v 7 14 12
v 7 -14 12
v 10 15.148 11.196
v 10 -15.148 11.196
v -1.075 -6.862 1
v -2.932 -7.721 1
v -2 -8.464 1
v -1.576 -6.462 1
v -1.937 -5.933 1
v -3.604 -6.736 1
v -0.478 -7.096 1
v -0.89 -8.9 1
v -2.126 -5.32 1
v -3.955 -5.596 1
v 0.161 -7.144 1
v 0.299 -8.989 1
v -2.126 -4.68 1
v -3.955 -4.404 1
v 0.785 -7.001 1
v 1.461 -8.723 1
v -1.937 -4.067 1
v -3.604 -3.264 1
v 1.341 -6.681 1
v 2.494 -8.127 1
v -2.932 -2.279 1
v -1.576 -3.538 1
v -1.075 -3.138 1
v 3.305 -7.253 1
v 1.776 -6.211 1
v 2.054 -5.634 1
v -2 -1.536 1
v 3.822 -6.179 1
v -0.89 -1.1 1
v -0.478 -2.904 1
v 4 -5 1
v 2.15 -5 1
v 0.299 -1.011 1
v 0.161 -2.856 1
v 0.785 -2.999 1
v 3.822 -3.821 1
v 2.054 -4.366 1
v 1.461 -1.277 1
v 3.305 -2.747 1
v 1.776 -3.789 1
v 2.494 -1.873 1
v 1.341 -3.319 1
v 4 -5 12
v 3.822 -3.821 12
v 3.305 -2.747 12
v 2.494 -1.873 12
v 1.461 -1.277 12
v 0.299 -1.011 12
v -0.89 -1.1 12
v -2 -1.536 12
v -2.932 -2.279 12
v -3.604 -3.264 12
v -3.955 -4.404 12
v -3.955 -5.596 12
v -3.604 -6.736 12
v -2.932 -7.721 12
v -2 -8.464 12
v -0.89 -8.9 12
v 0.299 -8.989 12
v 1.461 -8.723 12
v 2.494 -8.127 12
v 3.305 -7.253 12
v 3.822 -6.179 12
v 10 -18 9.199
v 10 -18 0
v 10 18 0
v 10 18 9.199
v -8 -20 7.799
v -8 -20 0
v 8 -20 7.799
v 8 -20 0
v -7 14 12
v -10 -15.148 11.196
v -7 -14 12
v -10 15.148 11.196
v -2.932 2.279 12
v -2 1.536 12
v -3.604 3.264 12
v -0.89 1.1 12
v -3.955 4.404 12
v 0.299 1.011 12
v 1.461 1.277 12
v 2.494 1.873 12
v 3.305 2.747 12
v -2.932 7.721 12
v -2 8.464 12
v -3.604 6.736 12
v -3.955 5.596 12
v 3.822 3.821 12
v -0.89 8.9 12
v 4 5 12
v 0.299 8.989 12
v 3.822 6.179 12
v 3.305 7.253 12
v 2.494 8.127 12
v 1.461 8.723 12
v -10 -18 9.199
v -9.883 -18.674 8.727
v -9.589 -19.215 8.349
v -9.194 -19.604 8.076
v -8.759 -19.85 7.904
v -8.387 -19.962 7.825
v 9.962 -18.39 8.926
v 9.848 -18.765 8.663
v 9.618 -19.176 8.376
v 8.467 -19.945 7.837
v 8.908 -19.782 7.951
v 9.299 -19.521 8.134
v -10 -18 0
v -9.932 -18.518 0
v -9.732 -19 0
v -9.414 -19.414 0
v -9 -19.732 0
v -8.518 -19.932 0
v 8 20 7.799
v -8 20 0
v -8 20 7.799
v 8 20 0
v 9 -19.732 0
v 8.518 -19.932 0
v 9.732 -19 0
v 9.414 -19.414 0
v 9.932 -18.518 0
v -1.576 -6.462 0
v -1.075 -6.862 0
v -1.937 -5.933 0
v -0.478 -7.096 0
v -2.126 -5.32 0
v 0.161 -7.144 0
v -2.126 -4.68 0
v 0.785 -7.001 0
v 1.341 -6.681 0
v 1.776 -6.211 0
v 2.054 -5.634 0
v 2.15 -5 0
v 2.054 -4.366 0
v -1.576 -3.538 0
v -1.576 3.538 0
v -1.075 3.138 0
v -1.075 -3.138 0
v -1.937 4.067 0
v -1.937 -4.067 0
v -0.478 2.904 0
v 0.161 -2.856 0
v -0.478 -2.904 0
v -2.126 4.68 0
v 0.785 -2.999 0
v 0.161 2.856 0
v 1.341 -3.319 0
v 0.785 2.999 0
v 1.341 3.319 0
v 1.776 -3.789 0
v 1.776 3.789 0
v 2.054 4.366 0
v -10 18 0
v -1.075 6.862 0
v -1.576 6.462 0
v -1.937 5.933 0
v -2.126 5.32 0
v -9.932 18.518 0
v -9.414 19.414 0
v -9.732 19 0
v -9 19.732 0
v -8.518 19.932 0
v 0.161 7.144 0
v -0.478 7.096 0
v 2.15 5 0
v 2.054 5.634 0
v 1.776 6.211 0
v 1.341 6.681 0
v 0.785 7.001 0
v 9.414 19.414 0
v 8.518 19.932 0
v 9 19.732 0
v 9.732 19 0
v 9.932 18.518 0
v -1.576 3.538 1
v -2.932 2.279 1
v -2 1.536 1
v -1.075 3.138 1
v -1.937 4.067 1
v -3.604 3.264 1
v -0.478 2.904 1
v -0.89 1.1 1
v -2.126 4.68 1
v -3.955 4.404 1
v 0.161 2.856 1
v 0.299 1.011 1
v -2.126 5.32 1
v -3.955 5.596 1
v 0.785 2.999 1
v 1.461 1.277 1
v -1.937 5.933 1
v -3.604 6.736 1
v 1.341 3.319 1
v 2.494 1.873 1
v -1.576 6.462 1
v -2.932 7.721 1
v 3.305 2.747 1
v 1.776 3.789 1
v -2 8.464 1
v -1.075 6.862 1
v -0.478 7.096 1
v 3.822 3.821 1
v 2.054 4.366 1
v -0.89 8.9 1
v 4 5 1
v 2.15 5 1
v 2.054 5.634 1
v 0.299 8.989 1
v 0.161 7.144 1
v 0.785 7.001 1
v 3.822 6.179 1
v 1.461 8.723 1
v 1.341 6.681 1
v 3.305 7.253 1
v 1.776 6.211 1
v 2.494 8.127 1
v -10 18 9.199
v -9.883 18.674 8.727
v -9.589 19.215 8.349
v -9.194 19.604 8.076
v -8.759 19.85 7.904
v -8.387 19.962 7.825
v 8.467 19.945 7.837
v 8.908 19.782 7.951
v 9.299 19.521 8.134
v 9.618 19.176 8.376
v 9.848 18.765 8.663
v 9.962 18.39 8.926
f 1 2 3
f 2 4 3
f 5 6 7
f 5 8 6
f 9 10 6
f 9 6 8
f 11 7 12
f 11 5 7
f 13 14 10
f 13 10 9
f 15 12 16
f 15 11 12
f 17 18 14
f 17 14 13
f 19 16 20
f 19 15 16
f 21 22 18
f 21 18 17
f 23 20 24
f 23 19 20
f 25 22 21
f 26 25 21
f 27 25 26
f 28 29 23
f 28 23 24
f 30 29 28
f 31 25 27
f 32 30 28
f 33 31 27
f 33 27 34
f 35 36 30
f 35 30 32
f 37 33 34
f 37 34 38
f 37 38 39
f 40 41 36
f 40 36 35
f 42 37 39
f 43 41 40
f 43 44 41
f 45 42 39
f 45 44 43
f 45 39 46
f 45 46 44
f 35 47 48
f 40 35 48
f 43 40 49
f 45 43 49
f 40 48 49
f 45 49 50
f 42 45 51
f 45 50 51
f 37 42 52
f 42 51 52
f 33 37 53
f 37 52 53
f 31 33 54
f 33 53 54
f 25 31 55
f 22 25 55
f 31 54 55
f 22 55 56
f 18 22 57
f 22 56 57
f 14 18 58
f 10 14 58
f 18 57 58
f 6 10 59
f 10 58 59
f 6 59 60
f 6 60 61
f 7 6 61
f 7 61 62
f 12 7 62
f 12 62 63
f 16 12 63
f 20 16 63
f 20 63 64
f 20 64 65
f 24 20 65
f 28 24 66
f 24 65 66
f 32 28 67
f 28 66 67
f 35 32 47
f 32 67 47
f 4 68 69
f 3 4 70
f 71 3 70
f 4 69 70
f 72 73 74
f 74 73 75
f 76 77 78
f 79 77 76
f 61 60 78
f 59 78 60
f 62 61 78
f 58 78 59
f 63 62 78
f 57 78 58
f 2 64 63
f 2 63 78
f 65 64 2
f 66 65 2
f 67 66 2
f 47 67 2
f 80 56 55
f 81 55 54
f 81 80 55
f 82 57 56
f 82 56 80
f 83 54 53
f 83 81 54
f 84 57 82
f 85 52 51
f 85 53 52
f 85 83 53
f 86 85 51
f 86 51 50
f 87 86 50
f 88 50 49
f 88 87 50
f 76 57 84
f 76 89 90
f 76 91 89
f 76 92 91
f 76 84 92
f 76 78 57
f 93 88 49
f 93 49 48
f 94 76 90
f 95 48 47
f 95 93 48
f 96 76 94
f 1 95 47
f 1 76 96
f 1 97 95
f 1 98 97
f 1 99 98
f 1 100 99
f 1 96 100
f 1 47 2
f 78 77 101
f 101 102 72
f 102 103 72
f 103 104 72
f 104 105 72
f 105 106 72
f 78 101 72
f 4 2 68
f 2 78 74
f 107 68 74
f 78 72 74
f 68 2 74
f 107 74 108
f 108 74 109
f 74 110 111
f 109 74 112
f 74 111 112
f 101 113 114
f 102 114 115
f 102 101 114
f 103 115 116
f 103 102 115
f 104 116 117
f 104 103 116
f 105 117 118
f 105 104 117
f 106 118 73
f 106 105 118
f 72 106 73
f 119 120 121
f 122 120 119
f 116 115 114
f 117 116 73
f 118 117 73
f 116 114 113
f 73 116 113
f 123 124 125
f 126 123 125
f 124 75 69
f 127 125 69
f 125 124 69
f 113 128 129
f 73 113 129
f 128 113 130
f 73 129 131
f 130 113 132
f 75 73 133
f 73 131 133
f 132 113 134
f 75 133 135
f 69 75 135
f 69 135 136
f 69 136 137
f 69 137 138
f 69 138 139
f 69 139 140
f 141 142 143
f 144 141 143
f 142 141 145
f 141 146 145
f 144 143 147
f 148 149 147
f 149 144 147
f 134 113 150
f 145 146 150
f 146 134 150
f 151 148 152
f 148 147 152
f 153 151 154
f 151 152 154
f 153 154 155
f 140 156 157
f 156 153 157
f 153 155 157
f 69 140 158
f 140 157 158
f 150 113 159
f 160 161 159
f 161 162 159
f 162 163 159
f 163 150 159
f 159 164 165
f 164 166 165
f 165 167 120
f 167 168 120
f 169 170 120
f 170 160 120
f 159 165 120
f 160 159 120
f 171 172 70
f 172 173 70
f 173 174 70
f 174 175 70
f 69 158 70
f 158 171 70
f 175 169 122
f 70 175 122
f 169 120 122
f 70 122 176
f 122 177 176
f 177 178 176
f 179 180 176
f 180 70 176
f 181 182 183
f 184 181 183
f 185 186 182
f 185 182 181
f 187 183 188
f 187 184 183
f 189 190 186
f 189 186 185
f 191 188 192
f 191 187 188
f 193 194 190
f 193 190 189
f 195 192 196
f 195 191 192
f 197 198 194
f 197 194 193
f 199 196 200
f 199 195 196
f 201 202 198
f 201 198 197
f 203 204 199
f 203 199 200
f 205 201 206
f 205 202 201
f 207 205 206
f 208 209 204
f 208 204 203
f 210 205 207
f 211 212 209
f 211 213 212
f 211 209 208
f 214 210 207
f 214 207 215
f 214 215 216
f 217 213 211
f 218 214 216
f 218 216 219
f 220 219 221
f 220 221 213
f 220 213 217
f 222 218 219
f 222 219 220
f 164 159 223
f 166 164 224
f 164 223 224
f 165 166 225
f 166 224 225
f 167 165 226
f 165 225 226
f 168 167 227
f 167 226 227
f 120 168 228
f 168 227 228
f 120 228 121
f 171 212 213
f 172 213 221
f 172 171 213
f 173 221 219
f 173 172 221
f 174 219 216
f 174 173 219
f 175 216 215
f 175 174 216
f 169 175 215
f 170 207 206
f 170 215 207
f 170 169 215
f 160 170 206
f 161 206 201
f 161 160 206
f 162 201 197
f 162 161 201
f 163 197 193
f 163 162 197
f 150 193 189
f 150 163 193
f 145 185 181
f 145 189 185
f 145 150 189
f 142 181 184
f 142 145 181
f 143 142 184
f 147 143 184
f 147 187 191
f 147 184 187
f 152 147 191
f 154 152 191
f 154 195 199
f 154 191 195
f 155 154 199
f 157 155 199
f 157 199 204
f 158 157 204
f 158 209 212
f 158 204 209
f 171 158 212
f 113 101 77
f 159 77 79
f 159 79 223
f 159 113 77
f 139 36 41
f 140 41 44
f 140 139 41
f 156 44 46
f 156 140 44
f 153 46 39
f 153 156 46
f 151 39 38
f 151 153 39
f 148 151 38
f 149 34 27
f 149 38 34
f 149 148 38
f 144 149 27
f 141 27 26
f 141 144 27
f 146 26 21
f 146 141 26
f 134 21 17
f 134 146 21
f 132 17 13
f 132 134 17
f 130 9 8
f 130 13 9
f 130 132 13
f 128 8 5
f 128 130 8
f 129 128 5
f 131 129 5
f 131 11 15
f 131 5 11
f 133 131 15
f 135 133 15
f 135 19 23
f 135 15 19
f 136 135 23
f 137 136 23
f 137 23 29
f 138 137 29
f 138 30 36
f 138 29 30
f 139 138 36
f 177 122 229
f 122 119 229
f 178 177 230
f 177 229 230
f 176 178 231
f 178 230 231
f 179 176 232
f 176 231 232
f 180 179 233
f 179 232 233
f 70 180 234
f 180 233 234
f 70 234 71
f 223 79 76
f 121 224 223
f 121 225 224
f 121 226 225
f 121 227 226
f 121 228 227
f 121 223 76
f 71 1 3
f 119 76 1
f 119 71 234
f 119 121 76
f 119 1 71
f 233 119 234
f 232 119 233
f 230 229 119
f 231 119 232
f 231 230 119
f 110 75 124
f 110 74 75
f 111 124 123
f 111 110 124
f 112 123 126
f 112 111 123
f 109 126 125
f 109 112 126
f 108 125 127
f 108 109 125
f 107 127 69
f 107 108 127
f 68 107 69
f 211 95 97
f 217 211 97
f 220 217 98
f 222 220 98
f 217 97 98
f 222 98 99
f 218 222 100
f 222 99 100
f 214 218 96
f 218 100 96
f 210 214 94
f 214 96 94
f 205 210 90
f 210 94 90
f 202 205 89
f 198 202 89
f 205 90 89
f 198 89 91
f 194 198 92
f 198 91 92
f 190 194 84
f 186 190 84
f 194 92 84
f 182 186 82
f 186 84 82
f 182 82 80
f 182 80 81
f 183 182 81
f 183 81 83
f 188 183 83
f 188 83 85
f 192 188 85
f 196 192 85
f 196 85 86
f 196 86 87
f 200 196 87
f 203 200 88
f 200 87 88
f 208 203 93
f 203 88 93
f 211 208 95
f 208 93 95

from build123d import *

# Parameters (mm, degrees)
SKETCH1_W           = 20
SKETCH1_H           = 40
SKETCH1_R           = 2.15
BOSS_EXTRUDE1_DEPTH = 12
CHAMFER1_SIZE       = 3
CHAMFER1_SIZE2      = 0.803847577
CHAMFER2_SIZE       = 6
CHAMFER2_SIZE2      = 4.201245229
SKETCH2_R           = 4
CUT_EXTRUDE1_DEPTH  = 11
FILLET1_R           = 2


with BuildPart() as part:
    # Sketch1 → Boss-Extrude1 (new body)
    with BuildSketch(Plane.XY):
        Rectangle(SKETCH1_W, SKETCH1_H)
        with Locations((0, -5)):
            Circle(SKETCH1_R, mode=Mode.SUBTRACT)
        with Locations((0, 5)):
            Circle(SKETCH1_R, mode=Mode.SUBTRACT)
    extrude(amount=BOSS_EXTRUDE1_DEPTH)

    # Chamfer1
    chamfer1_edges = [part.edges().sort_by_distance(p)[0] for p in [
        (-10, 0, 12),
        (10, 0, 12),
    ]]
    chamfer1_side = [part.faces().sort_by_distance(p)[0] for p in [
        (0, 0, 12),
    ]]
    chamfer(chamfer1_edges, length=CHAMFER1_SIZE, length2=CHAMFER1_SIZE2, reference=chamfer1_side[0])

    # Chamfer2
    chamfer2_edges = [part.edges().sort_by_distance(p)[0] for p in [
        (0, -20, 12),
        (0, 20, 12),
    ]]
    chamfer2_side = [part.faces().sort_by_distance(p)[0] for p in [
        (0, 0, 12),
    ]]
    chamfer(chamfer2_edges, length=CHAMFER2_SIZE, length2=CHAMFER2_SIZE2, reference=chamfer2_side[0])

    # Sketch2 → Cut-Extrude1 (cut)
    with BuildSketch(Plane.XY.offset(12)):
        with Locations((0, 5)):
            Circle(SKETCH2_R)
        with Locations((0, -5)):
            Circle(SKETCH2_R)
    extrude(amount=-CUT_EXTRUDE1_DEPTH, mode=Mode.SUBTRACT)

    # Fillet1
    fillet1_edges = [part.edges().sort_by_distance(p)[0] for p in [
        (10, 20, 3.899377385),
        (10, -20, 3.899377385),
        (-10, -20, 3.899377385),
        (-10, 20, 3.899377385),
    ]]
    fillet(fillet1_edges, radius=FILLET1_R)


solid = part.part
